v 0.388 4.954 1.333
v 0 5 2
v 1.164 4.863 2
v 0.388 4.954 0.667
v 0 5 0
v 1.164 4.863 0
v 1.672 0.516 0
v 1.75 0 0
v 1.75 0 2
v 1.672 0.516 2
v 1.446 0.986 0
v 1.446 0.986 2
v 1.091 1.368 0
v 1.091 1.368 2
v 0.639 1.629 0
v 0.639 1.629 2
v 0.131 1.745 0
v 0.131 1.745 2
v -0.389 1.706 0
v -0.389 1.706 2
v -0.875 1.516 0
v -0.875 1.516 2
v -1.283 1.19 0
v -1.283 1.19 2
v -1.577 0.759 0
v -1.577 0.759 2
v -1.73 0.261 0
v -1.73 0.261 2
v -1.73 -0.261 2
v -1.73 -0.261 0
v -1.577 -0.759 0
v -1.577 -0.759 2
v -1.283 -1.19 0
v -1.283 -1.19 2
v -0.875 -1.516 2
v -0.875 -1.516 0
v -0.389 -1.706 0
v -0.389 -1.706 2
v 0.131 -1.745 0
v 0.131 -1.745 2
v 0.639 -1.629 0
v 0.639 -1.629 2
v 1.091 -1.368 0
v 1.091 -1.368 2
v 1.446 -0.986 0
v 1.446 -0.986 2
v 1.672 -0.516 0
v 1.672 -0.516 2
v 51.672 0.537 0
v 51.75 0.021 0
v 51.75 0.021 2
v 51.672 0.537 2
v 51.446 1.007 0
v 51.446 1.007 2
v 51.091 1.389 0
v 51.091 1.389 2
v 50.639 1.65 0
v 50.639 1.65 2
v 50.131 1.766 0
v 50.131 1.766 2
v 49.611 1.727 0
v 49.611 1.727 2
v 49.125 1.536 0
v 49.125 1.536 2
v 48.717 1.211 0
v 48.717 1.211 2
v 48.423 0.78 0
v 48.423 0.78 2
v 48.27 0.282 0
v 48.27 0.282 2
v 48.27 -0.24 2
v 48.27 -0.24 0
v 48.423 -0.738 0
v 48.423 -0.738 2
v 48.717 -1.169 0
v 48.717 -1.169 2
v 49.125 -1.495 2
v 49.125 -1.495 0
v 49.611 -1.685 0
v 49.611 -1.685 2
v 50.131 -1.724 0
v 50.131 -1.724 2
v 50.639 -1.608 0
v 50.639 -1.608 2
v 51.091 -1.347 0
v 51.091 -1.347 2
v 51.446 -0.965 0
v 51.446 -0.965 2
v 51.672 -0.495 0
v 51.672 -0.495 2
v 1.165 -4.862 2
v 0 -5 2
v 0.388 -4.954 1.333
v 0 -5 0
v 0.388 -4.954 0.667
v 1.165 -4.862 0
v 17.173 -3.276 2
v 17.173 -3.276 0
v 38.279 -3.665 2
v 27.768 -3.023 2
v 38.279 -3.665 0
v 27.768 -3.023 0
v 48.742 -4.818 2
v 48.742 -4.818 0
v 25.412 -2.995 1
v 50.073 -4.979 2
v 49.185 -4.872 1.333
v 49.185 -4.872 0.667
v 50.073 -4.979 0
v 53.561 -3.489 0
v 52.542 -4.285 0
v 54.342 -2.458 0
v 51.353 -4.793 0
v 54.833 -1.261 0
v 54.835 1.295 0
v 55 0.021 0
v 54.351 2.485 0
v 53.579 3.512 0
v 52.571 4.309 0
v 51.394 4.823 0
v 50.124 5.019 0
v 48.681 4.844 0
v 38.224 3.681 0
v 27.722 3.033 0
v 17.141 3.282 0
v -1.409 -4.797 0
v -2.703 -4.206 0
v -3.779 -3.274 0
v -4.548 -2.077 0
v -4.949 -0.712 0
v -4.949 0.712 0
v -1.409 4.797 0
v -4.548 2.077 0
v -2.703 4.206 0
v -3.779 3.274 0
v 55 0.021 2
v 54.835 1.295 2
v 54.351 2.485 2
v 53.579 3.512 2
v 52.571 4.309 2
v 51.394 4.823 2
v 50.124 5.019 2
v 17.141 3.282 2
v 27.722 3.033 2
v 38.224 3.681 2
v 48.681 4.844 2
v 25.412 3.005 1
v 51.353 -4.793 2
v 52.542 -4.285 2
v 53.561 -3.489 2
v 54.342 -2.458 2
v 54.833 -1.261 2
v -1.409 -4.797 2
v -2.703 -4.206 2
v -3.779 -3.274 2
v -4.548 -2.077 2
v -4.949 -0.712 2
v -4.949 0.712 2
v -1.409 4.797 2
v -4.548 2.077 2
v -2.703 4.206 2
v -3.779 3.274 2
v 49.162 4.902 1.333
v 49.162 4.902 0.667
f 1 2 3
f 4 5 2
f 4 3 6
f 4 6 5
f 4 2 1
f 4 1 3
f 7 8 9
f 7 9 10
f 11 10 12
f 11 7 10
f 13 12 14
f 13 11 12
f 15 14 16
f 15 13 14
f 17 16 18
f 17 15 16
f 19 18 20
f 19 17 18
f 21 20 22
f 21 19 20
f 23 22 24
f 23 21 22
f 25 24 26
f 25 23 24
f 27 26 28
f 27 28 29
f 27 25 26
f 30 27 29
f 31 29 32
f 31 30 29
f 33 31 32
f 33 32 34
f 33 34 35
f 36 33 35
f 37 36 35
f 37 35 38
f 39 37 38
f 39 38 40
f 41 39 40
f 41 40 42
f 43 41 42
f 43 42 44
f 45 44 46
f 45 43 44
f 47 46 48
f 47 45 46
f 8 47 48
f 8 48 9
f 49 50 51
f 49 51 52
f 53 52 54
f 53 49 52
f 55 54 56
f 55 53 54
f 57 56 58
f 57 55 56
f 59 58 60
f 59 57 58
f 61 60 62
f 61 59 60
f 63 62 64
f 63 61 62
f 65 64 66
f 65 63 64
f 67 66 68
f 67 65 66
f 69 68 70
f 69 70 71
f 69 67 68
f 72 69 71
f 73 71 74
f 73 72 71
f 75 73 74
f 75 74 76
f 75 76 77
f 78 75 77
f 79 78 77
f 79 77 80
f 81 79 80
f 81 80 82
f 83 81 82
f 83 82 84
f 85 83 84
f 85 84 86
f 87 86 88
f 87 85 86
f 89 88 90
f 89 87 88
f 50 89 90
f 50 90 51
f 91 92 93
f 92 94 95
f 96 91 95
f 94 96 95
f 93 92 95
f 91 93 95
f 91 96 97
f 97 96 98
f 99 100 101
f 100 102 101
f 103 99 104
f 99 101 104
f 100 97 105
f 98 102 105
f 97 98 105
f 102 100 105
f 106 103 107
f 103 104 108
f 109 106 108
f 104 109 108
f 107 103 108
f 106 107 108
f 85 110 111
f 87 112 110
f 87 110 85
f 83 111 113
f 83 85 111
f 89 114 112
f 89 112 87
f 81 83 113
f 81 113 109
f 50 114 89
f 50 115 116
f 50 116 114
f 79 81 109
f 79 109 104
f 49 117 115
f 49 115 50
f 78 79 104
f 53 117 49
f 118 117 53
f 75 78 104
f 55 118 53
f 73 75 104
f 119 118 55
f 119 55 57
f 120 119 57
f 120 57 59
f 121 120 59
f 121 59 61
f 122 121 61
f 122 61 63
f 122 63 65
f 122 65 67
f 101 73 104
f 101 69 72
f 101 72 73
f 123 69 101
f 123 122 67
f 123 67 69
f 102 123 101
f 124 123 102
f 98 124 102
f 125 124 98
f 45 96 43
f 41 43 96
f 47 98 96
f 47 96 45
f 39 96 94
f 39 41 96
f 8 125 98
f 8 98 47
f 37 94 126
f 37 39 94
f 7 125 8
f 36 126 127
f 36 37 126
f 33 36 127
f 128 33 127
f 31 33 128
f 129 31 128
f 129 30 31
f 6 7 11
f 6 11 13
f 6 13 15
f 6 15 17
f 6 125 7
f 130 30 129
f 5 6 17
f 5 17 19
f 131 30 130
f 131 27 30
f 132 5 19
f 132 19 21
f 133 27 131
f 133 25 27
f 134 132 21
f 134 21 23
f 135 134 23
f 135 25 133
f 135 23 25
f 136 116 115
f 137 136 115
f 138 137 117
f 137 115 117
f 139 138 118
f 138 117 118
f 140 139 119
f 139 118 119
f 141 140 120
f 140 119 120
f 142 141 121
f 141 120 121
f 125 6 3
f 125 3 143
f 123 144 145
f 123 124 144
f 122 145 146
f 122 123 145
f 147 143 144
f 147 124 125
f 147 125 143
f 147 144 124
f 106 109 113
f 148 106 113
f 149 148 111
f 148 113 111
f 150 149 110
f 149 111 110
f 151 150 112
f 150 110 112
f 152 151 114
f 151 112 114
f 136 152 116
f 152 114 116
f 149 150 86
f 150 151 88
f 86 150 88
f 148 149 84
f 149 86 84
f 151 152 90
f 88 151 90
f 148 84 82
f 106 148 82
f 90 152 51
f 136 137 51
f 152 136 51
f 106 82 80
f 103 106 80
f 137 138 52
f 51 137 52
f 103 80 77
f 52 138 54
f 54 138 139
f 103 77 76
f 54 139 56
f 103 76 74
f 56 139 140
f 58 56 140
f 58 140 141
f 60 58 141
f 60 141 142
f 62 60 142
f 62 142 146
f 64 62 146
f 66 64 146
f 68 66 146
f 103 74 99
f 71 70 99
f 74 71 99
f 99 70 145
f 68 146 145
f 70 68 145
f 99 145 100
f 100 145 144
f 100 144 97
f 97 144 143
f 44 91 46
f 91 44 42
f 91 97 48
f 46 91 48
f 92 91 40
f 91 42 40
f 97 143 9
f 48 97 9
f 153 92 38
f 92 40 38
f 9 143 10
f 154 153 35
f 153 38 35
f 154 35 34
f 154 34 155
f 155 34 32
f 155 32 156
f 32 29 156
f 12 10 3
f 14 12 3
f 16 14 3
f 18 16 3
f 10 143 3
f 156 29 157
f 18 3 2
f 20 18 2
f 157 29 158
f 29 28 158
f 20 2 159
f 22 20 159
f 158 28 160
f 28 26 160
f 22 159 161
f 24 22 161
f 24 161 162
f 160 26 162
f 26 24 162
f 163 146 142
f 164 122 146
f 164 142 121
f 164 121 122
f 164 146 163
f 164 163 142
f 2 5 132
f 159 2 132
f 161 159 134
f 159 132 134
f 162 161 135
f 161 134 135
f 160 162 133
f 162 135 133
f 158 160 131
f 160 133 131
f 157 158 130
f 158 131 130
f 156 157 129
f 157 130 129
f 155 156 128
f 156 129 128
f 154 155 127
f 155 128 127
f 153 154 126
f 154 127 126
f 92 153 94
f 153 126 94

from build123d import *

# Parameters (mm, degrees)
F0_R     = 1.75
F1_DEPTH = 2


with BuildPart() as f1:
    # F0 (on Top) → F1 (new body)
    with BuildSketch(Plane.XY):
        with BuildLine():
            add(Edge.make_bspline(
                [(0, 5), (0.3879096976, 4.9541997763), (0.7758195621, 4.9083974868), (1.1637210766, 4.8626899198)],
                knots=[0, 0, 0, 0, 0.0229747267, 0.0229747267, 0.0229747267, 0.0229747267], degree=3))
            ThreePointArc((0, 5), (-5, 0), (0, -5))
            add(Edge.make_bspline(
                [(0, -5), (0.3884219151, -4.9540765878), (0.7768439434, -4.9081517555), (1.1652569528, -4.8623221031)],
                knots=[0, 0, 0, 0, 0.0230119064, 0.0230119064, 0.0230119064, 0.0230119064], degree=3))
            ThreePointArc((1.1652569528, -4.8623221031), (3.9259575115, -3.0962651078), (5, 0))
            ThreePointArc((5, 0), (3.9254684678, 3.0968850977), (1.1637210766, 4.8626899198))
        make_face()
        Circle(F0_R, mode=Mode.SUBTRACT)
        with BuildLine():
            add(Edge.make_bspline(
                [(1.1637210766, 4.8626899198), (9.2762111087, 3.9067715533), (25.2735349116, 2.1026460012), (40.9534234423, 3.9056306073), (48.6808792271, 4.8436985253)],
                knots=[0.0229747267, 0.0229747267, 0.0229747267, 0.0229747267, 0.5034632902, 0.9708949207, 0.9708949207, 0.9708949207, 0.9708949207], degree=3))
            ThreePointArc((1.1637210766, 4.8626899198), (3.9254684678, 3.0968850977), (5, 0))
            ThreePointArc((5, 0), (3.9259575115, -3.0962651078), (1.1652569528, -4.8623221031))
            add(Edge.make_bspline(
                [(1.1652569528, -4.8623221031), (9.2793010918, -3.9049292925), (25.3078629948, -2.0948602578), (40.9958544704, -3.8869187833), (48.7415823678, -4.8182057098)],
                knots=[0.0230119064, 0.0230119064, 0.0230119064, 0.0230119064, 0.5037363411, 0.9731005035, 0.9731005035, 0.9731005035, 0.9731005035], degree=3))
            ThreePointArc((48.7415823678, -4.8182057098), (45.0000943344, -0.0105696626), (48.6808792271, 4.8436985253))
        make_face()
        with BuildLine():
            add(Edge.make_bspline(
                [(48.6808792271, 4.8436985253), (49.1620366811, 4.9021082249), (49.6431766931, 4.9607078729), (50.1243168109, 5.0192975561)],
                knots=[0.9708949207, 0.9708949207, 0.9708949207, 0.9708949207, 1, 1, 1, 1], degree=3))
            ThreePointArc((48.6808792271, 4.8436985253), (45.0000943344, -0.0105696626), (48.7415823678, -4.8182057098))
            add(Edge.make_bspline(
                [(48.7415823678, -4.8182057098), (49.1854939332, -4.8715782324), (49.629390795, -4.9251017483), (50.0732877564, -4.9786194279)],
                knots=[0.9731005035, 0.9731005035, 0.9731005035, 0.9731005035, 1, 1, 1, 1], degree=3))
            ThreePointArc((50.0732877564, -4.9786194279), (53.5613479622, -3.488682203), (54.9999956555, 0.02084337))
            ThreePointArc((54.9999956555, 0.02084337), (53.5792138507, 3.5121464379), (50.1243168109, 5.0192975561))
        make_face()
        with Locations((49.9999956555, 0.02084337)):
            Circle(F0_R, mode=Mode.SUBTRACT)
    extrude(amount=F1_DEPTH)


solid = f1.part
